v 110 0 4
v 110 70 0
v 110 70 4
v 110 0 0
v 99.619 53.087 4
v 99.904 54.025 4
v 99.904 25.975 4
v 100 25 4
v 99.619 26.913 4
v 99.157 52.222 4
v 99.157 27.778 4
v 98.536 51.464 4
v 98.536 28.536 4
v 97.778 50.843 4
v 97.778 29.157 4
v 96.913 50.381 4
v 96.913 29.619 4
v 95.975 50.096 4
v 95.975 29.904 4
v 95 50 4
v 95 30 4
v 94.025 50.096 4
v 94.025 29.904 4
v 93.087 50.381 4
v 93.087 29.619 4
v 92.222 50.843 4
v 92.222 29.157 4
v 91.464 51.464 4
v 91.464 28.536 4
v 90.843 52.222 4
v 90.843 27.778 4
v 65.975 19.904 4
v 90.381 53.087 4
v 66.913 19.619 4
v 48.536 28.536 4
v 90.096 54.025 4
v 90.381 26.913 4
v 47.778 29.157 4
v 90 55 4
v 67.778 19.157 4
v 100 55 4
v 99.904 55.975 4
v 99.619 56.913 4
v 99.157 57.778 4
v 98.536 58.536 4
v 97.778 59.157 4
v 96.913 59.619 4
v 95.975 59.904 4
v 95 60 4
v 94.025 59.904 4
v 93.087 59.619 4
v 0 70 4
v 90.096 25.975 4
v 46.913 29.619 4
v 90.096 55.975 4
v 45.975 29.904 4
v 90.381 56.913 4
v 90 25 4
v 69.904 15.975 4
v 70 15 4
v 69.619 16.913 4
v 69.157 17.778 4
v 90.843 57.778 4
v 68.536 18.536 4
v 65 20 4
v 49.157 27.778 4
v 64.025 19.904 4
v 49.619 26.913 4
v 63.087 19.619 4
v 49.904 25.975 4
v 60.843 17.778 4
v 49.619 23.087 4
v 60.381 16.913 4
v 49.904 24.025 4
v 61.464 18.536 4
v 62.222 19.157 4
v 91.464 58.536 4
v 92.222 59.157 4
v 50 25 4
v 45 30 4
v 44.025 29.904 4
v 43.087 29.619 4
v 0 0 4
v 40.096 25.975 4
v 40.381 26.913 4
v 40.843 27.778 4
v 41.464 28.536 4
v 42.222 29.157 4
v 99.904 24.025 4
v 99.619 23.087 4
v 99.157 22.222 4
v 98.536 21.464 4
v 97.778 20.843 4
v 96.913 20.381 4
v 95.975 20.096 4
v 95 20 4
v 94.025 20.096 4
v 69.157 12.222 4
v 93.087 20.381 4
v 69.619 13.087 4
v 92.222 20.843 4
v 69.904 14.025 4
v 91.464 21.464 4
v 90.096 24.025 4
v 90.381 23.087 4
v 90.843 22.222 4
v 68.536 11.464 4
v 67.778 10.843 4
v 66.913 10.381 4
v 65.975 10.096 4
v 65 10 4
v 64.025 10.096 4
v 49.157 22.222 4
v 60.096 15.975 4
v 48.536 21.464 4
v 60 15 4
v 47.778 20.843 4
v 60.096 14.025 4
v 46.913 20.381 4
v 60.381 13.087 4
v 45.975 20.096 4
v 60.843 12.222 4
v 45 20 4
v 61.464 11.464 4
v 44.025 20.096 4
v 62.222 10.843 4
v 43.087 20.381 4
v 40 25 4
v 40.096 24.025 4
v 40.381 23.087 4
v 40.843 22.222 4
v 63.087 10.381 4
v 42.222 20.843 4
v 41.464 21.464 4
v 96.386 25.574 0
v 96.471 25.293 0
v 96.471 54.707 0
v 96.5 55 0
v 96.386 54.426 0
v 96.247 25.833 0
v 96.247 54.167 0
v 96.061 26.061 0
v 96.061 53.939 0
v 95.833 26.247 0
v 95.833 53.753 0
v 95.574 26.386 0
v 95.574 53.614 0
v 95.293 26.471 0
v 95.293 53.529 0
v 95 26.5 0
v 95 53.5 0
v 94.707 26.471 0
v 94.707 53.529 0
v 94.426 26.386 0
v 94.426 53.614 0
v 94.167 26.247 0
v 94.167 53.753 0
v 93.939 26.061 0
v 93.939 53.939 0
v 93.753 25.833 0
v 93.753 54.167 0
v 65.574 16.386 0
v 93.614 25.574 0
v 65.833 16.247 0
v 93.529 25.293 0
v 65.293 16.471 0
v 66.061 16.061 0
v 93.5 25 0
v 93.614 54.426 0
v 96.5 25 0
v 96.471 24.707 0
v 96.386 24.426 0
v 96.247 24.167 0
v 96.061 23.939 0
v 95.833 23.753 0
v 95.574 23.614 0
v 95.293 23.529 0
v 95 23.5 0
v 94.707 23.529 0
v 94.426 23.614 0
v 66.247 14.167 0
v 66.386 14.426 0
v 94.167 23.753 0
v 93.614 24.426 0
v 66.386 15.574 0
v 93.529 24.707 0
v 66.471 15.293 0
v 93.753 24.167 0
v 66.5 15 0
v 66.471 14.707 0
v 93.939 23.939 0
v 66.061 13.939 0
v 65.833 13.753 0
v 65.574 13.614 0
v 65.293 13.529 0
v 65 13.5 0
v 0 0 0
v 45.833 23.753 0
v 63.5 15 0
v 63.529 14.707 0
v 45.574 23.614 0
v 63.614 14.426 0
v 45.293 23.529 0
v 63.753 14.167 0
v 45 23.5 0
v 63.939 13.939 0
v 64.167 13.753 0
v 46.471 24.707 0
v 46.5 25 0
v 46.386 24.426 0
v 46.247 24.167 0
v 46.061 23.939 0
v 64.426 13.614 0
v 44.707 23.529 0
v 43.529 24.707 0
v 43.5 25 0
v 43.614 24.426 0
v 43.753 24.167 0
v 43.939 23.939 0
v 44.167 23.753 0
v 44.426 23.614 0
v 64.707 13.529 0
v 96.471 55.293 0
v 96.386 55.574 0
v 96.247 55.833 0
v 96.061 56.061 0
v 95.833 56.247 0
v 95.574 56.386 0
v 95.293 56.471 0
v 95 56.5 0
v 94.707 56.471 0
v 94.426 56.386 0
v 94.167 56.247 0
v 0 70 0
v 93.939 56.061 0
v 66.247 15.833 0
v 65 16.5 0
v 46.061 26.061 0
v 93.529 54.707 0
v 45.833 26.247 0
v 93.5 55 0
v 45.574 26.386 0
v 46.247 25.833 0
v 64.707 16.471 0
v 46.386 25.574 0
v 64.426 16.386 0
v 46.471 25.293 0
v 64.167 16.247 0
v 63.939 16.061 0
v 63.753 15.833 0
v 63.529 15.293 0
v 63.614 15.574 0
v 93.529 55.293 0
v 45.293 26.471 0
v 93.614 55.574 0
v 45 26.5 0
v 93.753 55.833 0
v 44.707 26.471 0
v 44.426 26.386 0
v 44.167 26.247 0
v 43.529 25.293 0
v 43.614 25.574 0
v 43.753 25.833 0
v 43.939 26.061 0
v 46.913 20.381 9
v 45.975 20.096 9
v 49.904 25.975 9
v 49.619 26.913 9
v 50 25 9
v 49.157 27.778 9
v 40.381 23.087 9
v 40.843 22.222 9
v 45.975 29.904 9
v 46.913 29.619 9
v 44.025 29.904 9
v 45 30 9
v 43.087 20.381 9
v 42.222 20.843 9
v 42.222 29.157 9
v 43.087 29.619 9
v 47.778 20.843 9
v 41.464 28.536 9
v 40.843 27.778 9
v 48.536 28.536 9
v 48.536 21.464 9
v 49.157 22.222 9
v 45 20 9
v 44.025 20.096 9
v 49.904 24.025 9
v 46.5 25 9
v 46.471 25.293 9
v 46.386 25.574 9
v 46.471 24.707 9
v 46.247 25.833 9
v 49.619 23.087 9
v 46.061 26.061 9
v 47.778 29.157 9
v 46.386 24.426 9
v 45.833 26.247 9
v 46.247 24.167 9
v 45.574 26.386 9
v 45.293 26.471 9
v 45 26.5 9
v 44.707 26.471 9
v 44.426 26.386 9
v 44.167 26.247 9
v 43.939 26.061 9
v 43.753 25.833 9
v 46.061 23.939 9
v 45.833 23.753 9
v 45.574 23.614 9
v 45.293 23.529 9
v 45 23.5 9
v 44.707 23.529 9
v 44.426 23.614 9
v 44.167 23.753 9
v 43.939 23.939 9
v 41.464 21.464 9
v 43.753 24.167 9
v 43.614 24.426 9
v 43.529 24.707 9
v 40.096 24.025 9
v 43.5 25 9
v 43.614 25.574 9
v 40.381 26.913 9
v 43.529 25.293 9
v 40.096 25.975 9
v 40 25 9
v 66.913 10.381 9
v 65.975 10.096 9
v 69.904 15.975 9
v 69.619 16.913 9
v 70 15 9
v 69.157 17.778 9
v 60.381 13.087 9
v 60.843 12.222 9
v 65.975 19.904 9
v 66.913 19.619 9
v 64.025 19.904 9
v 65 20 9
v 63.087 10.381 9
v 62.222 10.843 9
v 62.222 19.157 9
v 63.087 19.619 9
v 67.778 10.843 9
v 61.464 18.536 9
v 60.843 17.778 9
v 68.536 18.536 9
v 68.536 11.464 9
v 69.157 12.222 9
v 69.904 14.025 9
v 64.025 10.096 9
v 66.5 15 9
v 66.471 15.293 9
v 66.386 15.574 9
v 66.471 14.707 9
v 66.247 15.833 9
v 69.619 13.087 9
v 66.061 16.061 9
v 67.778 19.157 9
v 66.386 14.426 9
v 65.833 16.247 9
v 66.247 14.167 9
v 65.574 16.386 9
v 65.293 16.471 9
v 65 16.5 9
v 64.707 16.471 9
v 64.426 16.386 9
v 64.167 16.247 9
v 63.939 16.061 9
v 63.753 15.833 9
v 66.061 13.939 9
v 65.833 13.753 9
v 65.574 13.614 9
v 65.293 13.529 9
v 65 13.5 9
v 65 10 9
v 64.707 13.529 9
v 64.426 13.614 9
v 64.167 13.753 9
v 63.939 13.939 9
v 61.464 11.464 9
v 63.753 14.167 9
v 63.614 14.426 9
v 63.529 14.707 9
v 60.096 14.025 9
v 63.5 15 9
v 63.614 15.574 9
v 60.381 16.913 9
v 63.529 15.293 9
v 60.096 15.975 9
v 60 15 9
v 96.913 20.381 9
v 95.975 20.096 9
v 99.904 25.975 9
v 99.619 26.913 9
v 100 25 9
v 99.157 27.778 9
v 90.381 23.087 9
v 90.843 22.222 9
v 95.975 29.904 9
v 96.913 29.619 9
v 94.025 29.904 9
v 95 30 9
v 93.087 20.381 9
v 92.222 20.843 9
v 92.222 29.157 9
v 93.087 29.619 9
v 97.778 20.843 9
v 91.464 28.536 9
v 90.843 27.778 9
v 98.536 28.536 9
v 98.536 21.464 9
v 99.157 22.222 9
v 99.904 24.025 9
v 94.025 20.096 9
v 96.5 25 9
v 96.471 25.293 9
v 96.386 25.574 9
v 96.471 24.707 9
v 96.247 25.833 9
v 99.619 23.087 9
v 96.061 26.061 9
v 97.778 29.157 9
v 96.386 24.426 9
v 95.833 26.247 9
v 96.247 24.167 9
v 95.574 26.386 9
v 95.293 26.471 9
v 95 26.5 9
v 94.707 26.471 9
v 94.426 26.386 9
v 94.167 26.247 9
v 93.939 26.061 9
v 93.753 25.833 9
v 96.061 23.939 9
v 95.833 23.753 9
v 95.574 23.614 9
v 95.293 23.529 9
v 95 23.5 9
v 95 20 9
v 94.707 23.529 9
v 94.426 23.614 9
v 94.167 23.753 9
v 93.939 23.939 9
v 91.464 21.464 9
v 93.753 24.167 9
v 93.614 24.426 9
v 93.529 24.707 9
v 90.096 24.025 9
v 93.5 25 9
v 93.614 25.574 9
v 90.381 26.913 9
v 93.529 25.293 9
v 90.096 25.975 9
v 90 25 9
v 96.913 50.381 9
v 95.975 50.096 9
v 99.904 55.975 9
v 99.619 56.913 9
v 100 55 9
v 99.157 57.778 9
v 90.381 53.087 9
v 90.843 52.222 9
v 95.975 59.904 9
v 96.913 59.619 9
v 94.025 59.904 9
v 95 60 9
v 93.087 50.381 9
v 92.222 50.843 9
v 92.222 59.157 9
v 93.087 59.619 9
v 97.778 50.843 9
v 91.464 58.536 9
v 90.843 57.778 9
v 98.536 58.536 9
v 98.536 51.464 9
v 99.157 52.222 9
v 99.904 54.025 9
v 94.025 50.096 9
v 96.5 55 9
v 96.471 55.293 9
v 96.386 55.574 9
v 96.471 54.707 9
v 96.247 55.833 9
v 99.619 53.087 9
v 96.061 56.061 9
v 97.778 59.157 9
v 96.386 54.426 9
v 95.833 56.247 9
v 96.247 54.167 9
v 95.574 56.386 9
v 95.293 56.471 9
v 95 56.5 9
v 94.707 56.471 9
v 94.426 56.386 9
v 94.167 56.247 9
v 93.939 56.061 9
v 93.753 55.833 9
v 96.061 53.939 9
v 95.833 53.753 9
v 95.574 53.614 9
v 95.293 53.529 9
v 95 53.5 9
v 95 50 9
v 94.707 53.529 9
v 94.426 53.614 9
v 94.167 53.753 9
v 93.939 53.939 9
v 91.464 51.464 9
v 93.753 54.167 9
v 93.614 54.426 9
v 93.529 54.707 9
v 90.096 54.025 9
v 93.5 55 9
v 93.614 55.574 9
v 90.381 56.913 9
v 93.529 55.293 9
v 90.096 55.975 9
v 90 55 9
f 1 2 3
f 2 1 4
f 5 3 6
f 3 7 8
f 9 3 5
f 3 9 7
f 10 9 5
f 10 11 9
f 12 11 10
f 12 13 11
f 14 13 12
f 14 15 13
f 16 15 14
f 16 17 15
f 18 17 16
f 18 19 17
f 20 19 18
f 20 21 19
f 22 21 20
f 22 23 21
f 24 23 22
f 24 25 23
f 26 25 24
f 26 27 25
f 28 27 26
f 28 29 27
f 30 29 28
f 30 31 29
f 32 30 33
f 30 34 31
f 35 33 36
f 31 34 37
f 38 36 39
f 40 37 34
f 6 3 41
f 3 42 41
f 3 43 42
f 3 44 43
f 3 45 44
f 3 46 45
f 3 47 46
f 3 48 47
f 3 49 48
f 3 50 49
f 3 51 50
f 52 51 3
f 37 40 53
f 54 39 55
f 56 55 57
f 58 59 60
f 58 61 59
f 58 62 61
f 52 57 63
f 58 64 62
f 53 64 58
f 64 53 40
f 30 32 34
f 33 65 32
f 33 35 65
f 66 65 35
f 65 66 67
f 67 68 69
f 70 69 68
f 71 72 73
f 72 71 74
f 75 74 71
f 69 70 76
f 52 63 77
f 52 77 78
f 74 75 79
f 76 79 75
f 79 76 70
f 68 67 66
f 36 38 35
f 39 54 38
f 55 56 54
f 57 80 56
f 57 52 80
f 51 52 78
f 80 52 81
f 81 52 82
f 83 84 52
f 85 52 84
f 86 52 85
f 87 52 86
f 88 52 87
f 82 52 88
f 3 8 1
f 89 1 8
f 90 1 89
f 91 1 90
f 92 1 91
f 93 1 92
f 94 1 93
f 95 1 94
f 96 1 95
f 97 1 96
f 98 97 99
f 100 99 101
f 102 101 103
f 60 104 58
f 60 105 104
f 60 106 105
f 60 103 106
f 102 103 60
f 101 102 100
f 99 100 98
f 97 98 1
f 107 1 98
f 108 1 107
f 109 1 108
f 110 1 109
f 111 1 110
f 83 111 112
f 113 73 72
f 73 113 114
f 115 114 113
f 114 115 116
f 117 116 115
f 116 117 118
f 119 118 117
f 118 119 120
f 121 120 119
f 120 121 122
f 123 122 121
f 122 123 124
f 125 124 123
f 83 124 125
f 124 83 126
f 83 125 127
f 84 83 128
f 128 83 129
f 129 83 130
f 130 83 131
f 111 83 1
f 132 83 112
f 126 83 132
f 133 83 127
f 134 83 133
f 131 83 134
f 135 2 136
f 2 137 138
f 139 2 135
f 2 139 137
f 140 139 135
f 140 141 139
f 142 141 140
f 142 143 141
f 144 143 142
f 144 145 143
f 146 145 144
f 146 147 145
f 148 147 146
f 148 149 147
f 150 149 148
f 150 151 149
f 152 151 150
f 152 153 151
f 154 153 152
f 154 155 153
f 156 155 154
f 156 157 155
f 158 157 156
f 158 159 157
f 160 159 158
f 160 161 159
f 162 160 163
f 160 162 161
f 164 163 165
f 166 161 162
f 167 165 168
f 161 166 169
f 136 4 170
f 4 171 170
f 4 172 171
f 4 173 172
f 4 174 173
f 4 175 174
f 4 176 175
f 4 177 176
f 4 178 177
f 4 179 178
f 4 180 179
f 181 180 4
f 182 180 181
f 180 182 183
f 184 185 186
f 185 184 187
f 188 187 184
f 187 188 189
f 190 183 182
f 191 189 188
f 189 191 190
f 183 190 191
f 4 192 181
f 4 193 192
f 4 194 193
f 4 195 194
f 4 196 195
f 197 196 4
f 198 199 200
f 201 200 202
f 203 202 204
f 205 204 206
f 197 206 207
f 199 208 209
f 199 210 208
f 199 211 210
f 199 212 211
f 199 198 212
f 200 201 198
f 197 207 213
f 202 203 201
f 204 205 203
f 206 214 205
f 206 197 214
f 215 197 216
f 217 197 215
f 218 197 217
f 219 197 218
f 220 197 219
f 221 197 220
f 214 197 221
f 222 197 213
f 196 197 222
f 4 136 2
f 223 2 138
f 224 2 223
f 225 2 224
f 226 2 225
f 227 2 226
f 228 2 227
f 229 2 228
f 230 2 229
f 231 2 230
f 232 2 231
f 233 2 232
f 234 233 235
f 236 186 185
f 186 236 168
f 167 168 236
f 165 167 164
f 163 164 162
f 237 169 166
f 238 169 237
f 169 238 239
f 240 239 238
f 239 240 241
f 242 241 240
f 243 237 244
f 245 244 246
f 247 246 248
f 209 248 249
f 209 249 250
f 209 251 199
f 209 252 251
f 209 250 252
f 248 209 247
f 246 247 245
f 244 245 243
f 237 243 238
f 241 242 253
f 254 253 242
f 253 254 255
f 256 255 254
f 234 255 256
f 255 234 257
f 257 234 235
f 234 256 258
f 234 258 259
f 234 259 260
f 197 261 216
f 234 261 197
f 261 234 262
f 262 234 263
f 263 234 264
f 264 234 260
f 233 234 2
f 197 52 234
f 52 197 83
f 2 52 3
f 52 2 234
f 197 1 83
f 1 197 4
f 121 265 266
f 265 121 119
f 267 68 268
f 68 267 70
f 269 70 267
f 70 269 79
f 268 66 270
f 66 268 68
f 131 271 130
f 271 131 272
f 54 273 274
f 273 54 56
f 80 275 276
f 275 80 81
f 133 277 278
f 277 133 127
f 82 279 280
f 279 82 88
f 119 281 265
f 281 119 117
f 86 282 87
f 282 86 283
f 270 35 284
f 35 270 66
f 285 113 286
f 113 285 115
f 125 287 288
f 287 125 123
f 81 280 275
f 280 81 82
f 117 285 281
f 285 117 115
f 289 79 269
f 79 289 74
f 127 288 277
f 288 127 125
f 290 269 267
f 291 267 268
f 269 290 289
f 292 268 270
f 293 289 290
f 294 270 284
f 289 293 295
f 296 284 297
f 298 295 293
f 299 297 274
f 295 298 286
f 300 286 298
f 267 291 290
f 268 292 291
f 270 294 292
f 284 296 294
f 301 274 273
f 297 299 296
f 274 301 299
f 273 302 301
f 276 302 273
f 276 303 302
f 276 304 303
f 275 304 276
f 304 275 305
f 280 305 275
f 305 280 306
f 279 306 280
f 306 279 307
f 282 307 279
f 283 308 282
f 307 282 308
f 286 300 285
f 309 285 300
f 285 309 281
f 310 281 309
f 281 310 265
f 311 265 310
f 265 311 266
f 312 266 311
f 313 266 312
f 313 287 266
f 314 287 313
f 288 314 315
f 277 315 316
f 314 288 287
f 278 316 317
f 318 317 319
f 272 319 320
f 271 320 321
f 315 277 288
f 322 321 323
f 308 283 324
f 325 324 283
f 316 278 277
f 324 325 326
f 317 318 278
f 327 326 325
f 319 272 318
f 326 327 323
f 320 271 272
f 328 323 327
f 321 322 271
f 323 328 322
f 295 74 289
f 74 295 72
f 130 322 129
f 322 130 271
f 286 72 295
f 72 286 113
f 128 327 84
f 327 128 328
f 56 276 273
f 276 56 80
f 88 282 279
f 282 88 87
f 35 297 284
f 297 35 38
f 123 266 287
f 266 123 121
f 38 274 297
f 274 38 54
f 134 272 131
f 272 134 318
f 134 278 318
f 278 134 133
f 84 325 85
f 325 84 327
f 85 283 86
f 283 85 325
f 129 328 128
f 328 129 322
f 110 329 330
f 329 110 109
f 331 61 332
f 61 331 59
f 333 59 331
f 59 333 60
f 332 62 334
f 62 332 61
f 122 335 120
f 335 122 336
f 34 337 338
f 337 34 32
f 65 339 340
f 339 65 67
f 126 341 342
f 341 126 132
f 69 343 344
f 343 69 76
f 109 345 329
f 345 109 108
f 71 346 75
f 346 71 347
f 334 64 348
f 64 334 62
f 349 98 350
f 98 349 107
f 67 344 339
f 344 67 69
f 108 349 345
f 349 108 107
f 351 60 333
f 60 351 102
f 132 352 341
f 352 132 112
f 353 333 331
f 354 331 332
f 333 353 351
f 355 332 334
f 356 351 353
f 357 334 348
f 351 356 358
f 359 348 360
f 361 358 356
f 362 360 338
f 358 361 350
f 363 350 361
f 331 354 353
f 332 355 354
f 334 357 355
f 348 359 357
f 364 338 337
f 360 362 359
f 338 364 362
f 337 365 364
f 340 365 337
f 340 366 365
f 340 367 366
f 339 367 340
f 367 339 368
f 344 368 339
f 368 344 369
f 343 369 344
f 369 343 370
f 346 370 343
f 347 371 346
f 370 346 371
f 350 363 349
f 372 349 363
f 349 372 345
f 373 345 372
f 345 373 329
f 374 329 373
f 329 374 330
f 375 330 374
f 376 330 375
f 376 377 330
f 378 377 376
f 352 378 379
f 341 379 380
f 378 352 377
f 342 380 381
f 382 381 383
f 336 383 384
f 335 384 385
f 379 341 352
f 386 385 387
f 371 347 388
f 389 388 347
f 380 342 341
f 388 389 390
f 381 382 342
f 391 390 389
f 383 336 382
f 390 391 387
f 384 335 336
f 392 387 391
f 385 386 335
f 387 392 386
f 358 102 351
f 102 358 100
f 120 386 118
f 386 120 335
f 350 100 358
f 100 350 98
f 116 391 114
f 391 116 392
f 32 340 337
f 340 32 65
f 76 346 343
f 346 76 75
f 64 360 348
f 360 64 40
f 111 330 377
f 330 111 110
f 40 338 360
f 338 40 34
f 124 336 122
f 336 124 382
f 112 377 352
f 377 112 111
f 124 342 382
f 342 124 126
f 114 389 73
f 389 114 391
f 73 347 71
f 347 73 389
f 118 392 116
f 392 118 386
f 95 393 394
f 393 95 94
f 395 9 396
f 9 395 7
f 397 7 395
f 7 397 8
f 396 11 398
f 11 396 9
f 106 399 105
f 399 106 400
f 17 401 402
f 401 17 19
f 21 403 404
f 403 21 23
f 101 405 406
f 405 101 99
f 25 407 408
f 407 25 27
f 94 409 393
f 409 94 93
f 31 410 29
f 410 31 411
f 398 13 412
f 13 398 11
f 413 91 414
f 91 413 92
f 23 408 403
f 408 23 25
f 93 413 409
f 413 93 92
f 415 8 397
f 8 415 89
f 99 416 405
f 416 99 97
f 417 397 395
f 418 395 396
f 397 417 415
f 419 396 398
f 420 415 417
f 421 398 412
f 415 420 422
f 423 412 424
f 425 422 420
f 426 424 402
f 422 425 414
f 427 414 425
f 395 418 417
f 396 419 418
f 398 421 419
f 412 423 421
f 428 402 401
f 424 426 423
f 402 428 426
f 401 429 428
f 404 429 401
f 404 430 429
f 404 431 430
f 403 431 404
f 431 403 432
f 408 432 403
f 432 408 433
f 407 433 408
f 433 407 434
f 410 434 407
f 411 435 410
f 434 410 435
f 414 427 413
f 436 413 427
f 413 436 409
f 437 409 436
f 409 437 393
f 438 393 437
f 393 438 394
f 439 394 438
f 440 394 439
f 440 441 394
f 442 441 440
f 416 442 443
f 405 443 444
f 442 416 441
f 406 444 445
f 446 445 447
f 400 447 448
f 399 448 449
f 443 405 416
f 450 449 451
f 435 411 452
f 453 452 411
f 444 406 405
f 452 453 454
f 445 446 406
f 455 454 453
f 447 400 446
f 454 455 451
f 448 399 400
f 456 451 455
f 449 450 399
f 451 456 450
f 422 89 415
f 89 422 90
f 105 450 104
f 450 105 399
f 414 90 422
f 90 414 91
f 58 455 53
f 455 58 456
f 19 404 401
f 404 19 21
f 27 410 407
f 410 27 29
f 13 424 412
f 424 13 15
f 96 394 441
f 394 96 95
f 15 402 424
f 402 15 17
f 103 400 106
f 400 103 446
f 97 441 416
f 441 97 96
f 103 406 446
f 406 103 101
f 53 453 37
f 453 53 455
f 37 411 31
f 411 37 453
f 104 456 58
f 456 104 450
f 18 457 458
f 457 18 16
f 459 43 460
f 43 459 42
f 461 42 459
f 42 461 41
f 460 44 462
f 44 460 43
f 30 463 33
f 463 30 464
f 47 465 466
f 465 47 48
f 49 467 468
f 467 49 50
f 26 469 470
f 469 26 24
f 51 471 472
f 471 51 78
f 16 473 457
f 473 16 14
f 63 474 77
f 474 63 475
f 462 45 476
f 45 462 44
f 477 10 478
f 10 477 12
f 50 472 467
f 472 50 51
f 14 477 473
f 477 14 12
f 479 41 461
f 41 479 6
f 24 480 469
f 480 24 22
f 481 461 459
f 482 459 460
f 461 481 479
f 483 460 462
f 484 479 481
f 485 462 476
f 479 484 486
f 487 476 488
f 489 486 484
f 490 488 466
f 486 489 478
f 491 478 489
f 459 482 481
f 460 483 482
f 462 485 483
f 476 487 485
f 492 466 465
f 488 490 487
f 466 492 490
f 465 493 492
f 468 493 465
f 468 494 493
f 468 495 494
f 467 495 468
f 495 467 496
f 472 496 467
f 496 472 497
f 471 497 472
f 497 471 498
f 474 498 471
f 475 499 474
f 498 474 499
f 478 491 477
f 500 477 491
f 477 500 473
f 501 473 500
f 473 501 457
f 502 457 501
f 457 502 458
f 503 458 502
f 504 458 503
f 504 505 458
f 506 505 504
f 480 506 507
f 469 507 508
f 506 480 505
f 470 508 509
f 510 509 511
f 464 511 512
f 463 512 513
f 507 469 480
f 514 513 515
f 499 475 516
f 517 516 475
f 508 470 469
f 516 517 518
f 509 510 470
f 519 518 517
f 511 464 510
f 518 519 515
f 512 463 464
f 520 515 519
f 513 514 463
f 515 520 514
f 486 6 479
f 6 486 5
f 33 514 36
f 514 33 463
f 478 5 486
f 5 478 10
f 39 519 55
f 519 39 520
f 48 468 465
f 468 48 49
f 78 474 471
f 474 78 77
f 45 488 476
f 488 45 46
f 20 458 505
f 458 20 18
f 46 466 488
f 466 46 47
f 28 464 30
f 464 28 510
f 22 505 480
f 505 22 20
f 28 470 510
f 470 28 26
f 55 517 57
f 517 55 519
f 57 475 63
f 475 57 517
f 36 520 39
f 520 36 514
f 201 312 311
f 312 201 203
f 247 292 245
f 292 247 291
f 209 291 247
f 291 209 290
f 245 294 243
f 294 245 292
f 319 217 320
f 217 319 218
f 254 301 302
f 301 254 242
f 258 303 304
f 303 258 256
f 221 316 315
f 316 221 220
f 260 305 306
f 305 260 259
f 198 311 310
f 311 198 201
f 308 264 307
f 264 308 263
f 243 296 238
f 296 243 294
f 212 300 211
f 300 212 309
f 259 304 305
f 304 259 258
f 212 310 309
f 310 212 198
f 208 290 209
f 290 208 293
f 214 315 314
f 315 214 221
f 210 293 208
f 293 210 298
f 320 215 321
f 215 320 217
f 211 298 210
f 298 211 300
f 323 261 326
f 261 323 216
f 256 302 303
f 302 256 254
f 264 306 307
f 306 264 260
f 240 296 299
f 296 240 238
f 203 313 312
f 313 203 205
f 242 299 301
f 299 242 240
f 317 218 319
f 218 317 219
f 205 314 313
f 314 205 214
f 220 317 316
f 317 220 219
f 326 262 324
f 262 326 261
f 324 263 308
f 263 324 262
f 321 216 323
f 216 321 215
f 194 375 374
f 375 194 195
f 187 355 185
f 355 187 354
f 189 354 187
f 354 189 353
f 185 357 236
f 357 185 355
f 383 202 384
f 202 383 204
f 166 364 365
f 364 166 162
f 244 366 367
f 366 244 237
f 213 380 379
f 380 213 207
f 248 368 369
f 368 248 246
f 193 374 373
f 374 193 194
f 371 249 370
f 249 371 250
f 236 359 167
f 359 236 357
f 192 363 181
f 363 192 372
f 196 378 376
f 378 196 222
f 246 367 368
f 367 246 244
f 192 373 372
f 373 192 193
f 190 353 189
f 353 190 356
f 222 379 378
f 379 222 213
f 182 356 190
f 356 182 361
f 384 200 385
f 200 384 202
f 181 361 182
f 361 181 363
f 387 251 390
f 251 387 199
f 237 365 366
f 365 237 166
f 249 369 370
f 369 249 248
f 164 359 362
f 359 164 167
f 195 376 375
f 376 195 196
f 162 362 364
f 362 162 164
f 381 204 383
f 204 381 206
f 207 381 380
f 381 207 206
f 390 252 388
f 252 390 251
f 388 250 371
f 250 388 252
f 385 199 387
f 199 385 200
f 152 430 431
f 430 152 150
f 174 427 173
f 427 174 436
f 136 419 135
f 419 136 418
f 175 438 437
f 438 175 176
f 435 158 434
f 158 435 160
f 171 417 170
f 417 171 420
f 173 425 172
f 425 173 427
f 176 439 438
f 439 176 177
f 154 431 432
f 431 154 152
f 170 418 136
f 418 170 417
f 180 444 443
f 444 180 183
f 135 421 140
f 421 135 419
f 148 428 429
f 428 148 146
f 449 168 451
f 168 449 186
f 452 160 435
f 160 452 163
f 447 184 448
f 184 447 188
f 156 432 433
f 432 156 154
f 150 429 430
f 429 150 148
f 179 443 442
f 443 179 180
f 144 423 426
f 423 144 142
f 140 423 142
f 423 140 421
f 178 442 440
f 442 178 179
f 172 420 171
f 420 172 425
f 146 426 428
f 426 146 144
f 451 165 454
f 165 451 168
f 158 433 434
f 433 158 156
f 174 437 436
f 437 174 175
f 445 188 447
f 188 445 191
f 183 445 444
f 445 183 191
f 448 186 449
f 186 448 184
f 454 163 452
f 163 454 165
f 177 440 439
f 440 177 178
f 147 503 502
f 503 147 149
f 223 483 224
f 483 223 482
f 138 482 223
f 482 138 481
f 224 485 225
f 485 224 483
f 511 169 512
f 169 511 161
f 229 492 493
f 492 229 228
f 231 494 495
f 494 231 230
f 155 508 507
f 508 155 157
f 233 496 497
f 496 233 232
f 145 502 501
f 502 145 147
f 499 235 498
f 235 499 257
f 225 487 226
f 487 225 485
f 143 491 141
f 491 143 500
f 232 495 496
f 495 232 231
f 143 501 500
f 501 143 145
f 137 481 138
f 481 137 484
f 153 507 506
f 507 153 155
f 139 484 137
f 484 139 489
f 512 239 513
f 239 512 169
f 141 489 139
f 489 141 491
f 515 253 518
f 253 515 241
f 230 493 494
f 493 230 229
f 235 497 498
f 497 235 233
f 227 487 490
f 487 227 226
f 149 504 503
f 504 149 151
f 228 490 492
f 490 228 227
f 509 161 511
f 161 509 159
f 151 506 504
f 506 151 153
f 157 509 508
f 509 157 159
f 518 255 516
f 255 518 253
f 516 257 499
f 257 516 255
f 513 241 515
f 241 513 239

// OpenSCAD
$fn = 32;

// ----------------------------------------------------------------------
// Boss field: plate with bosses at given coordinates
// ----------------------------------------------------------------------

// --- parameters (mm) ---
plate_l = 110;            // plate length, X
plate_w = 70;             // plate width, Y
plate_t = 4;              // plate thickness, Z
boss_d = 10;              // boss diameter
boss_h = 5;               // boss height above the plate
bore_d = 3;               // boss bore

total_h = plate_t + boss_h;  // overall height

difference() {
  union() {
    cube([plate_l, plate_w, plate_t]);
    translate([45, 25, plate_t]) cylinder(h = boss_h, d = boss_d);
    translate([65, 15, plate_t]) cylinder(h = boss_h, d = boss_d);
    translate([95, 25, plate_t]) cylinder(h = boss_h, d = boss_d);
    translate([95, 55, plate_t]) cylinder(h = boss_h, d = boss_d);
  }
  translate([45, 25, -1]) cylinder(h = total_h + 2, d = bore_d);
  translate([65, 15, -1]) cylinder(h = total_h + 2, d = bore_d);
  translate([95, 25, -1]) cylinder(h = total_h + 2, d = bore_d);
  translate([95, 55, -1]) cylinder(h = total_h + 2, d = bore_d);
}
